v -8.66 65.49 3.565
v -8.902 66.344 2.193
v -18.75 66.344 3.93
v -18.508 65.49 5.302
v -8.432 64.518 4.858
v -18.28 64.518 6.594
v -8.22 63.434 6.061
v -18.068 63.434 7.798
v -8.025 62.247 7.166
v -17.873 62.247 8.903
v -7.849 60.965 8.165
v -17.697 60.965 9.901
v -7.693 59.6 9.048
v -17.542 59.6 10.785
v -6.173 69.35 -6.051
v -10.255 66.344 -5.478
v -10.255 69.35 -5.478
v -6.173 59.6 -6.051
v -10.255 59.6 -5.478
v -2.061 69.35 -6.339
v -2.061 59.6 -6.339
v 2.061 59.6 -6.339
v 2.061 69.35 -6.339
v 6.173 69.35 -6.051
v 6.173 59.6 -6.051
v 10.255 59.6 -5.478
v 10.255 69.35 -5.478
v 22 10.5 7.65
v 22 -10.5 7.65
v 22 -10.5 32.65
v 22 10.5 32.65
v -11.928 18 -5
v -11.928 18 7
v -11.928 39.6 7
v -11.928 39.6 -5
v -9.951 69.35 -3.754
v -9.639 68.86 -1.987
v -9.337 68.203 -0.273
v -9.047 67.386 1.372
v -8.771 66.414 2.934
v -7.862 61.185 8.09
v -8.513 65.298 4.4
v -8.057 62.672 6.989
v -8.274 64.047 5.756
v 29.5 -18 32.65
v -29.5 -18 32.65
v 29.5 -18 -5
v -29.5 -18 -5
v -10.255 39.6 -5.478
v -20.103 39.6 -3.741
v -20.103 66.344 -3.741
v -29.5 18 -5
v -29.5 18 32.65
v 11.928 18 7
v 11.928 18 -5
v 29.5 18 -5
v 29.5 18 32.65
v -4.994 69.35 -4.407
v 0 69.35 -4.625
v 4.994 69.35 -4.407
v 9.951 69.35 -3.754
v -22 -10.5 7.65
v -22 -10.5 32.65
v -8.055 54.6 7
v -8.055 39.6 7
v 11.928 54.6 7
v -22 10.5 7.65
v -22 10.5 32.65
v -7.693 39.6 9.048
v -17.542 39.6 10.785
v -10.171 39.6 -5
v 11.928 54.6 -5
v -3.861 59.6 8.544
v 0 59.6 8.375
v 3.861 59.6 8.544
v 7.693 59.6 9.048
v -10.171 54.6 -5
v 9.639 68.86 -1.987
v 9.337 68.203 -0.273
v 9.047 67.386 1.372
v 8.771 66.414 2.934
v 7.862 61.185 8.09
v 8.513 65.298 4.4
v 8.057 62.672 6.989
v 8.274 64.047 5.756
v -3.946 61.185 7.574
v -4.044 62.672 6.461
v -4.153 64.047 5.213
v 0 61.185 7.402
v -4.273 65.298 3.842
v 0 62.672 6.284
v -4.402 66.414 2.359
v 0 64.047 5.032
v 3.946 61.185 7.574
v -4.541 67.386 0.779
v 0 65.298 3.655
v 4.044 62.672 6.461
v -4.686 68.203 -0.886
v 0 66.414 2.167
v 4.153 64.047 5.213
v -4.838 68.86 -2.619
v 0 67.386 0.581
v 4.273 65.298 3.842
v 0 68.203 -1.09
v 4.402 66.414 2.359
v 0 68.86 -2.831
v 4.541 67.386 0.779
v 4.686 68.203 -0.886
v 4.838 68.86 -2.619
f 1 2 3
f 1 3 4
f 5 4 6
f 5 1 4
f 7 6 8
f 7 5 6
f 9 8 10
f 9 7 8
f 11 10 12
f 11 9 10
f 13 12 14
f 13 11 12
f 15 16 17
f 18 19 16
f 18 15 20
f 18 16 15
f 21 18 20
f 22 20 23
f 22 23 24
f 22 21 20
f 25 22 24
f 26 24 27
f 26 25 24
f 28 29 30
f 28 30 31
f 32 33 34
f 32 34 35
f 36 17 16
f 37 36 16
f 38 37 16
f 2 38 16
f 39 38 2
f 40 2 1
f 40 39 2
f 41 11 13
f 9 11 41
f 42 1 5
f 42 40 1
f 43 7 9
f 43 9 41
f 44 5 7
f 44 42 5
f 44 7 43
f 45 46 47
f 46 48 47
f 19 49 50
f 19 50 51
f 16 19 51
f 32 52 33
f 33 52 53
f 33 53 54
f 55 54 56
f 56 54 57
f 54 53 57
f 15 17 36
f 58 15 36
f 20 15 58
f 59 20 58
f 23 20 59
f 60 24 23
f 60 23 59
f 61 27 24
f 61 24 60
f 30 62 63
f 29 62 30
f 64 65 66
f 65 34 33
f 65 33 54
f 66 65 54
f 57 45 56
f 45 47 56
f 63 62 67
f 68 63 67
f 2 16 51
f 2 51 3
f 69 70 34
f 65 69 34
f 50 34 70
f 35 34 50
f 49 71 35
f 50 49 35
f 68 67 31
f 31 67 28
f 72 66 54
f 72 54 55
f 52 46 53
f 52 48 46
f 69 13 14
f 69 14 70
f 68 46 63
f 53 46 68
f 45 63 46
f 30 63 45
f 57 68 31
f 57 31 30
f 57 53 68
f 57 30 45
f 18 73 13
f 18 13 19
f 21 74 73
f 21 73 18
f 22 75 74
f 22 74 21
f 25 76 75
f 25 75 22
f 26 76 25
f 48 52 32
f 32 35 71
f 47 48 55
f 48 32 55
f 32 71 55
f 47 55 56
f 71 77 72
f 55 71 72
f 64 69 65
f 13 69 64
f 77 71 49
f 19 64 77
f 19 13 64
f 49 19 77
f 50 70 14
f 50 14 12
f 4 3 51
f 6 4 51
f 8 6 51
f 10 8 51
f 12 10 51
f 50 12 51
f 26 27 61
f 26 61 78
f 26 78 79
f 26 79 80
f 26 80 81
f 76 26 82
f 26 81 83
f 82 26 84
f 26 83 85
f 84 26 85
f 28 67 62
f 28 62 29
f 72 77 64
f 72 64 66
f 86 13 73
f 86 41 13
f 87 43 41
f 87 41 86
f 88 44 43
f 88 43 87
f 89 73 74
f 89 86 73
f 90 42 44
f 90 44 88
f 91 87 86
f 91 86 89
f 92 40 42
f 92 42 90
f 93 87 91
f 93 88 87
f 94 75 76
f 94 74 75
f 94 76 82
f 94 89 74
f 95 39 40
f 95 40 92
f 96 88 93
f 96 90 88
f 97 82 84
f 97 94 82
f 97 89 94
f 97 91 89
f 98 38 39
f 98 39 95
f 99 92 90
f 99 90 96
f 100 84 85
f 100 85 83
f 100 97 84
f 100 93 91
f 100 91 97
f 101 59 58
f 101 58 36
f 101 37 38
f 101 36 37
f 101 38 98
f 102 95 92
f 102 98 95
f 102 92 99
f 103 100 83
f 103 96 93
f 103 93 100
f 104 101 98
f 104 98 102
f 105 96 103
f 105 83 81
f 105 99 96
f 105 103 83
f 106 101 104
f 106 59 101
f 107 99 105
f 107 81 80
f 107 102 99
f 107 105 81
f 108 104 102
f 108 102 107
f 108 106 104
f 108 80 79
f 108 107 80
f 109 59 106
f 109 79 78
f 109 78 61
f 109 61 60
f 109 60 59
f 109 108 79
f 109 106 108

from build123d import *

# Parameters (mm, degrees)
SKETCH3_W           = 59
SKETCH3_H           = 36
SKETCH3_W_2         = 44
SKETCH3_H_2         = 21
BOSS_EXTRUDE1_DEPTH = 10
SKETCH3_2_W         = 59
SKETCH3_2_H         = 36
SKETCH3_2_W_2       = 44
SKETCH3_2_H_2       = 21
BOSS_EXTRUDE2_DEPTH = 5
SKETCH4_W           = 23.855112314
SKETCH4_H           = 12
BOSS_EXTRUDE3_DEPTH = 36.6
REVOLVE1_ANGLE      = 20
BOSS_EXTRUDE4_DEPTH = 10
BOSS_EXTRUDE5_REACH = 83.498
SKETCH9_W           = 12
SKETCH9_H           = 10.265164511
SKETCH3_4_W         = 59
SKETCH3_4_H         = 36
SKETCH3_4_W_2       = 44
SKETCH3_4_H_2       = 21
BOSS_EXTRUDE6_DEPTH = 7.65
BOSS_EXTRUDE7_START = 7.65
SKETCH3_5_W         = 59
SKETCH3_5_H         = 36
SKETCH3_5_W_2       = 44
SKETCH3_5_H_2       = 21
BOSS_EXTRUDE7_DEPTH = 25


with BuildPart() as part:
    # Sketch3 → Boss-Extrude1 (new body)
    with BuildSketch(Plane.XY):
        Rectangle(SKETCH3_W, SKETCH3_H)
        Rectangle(SKETCH3_W_2, SKETCH3_H_2, mode=Mode.SUBTRACT)
    extrude(amount=BOSS_EXTRUDE1_DEPTH)

    # Sketch3<2> → Boss-Extrude2 (add)
    # profile 1 of 2: a face of its own
    with BuildSketch(Plane.XY):
        Rectangle(SKETCH3_2_W, SKETCH3_2_H)
        Rectangle(SKETCH3_2_W_2, SKETCH3_2_H_2, mode=Mode.SUBTRACT)
    # profile 2 of 2: a face of its own
    with BuildSketch(Plane.XY):
        Rectangle(SKETCH3_2_W_2, SKETCH3_2_H_2)
    extrude(amount=-BOSS_EXTRUDE2_DEPTH)

    # Sketch4 → Boss-Extrude3 (add)
    with BuildSketch(Plane(origin=(0, 18, 0), x_dir=(1, 0, 0), z_dir=(0, 1, 0))):
        with Locations((0, -1)):
            Rectangle(SKETCH4_W, SKETCH4_H)
    extrude(amount=BOSS_EXTRUDE3_DEPTH)



with BuildPart() as body_2:
    # Sketch5 → Revolve1 (revolve, symmetric)
    with BuildSketch(Plane(origin=(0, 0, 0), x_dir=(0, 0, -1), z_dir=(1, 0, 0))) as revolve1_sk:
        with BuildLine():
            Line((6.375, 59.6), (-8.375, 59.6))
            ThreePointArc((-8.375, 59.6), (-2.924218778, 65.873958371), (4.625, 69.35))
            Line((4.625, 69.35), (6.375, 69.35))
            Line((6.375, 69.35), (6.375, 59.6))
        make_face()
    revolve(axis=Axis((0, -41.396267669, 52.68), (0, 1, 0)), revolution_arc=REVOLVE1_ANGLE / 2)
    revolve(revolve1_sk.sketch, axis=Axis((0, -41.396267669, 52.68), (0, -1, 0)), revolution_arc=REVOLVE1_ANGLE / 2)

    # Sketch7 → Boss-Extrude4 (add)
    with BuildSketch(Plane(origin=(-9.008810575, 0, 1.588496368), x_dir=(-0.17364817766693075, 0, -0.9848077530122081), z_dir=(0.9848077530122081, 0, -0.17364817766693075))):
        with BuildLine():
            Line((7.175327571, 59.6), (7.175327571, 66.343971629))
            Line((7.175327571, 66.343971629), (-0.614099568, 66.343971629))
            ThreePointArc((-0.614099568, 66.343971629), (-4.541815528, 63.433785776), (-7.574672429, 59.6))
            Line((-7.574672429, 59.6), (-7.574672429, 39.6))
            Line((-7.574672429, 39.6), (7.175327571, 39.6))
            Line((7.175327571, 39.6), (7.175327571, 59.6))
        make_face()
    extrude(amount=-BOSS_EXTRUDE4_DEPTH)


with BuildPart() as part_1:
    add(part.part)

    add(body_2.part)  # Boss-Extrude5 merges body 2
    # Boss-Extrude5: up to this plane
    boss_extrude5_end = Plane(origin=(-9.008810575, 0, 1.588496368), z_dir=(-0.9848077530122081, 0, 0.17364817766693075))
    # Sketch9 → Boss-Extrude5 (add, up to the surface)
    with BuildSketch(Plane(origin=(-11.927556157, 0, 0), x_dir=(0, 0, -1), z_dir=(1, 0, 0)), mode=Mode.PRIVATE) as boss_extrude5_sk1:
        with Locations((-1, 49.467417744)):
            Rectangle(SKETCH9_W, SKETCH9_H)
    boss_extrude5_tool1 = split(extrude(boss_extrude5_sk1.sketch, amount=BOSS_EXTRUDE5_REACH, mode=Mode.PRIVATE), bisect_by=boss_extrude5_end, keep=Keep.BOTH, mode=Mode.PRIVATE)
    add(boss_extrude5_tool1.solids().sort_by_distance((-11.927556, 49.467418, 1))[0])

    # Sketch3<4> → Boss-Extrude6 (add)
    # profile 1 of 2: a face of its own
    with BuildSketch(Plane.XY):
        Rectangle(SKETCH3_4_W, SKETCH3_4_H)
        Rectangle(SKETCH3_4_W_2, SKETCH3_4_H_2, mode=Mode.SUBTRACT)
    # profile 2 of 2: a face of its own
    with BuildSketch(Plane.XY):
        Rectangle(SKETCH3_4_W_2, SKETCH3_4_H_2)
    extrude(amount=BOSS_EXTRUDE6_DEPTH)

    # Sketch3<5> → Boss-Extrude7 (add)
    with BuildSketch(Plane.XY.offset(BOSS_EXTRUDE7_START)):
        Rectangle(SKETCH3_5_W, SKETCH3_5_H)
        Rectangle(SKETCH3_5_W_2, SKETCH3_5_H_2, mode=Mode.SUBTRACT)
    extrude(amount=BOSS_EXTRUDE7_DEPTH)


solid = part_1.part
